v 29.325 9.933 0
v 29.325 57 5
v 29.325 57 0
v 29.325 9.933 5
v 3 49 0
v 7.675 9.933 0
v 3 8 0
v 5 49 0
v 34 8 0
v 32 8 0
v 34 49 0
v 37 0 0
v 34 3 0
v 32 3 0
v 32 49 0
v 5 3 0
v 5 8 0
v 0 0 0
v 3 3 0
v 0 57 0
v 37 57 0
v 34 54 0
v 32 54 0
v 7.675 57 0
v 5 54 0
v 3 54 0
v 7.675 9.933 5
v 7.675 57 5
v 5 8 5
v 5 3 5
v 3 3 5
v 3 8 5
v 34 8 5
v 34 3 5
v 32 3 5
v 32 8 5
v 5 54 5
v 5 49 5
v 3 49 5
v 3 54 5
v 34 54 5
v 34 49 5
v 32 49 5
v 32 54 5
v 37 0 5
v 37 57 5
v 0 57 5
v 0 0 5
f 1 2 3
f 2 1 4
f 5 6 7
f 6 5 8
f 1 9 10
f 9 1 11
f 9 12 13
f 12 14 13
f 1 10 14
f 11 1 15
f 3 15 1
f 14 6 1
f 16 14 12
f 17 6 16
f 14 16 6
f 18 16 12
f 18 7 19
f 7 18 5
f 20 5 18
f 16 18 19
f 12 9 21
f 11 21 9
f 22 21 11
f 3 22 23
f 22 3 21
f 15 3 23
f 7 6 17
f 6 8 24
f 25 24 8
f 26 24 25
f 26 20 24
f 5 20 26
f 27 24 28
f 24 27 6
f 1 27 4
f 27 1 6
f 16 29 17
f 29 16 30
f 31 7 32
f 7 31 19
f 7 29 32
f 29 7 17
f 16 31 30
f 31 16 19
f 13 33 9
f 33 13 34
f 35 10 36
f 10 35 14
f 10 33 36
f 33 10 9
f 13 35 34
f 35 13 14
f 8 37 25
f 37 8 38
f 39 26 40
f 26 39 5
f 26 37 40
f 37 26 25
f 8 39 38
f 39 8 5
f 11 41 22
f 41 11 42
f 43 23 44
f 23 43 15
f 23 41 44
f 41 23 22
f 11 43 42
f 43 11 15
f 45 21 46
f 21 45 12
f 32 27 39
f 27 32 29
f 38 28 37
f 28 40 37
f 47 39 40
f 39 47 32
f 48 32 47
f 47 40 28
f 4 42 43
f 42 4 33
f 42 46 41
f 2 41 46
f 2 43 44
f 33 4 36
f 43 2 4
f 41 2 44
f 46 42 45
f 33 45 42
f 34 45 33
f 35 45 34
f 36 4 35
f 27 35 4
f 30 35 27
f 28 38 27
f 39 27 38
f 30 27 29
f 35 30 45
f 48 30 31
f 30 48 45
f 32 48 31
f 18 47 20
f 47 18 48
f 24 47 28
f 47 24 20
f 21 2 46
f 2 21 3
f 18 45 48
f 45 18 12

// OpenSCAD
// Mount for cateye strada cadence sensor (zip tie)
// Created 30 August 2026 by Sam Gardner <sam@wx4stg.com>

inner_x = 21.65;
iouter_x = 25;
inner_y = 21.133;
iouter_y = 25;
plate_depth = 5;

ziptie_x_inset = 3;
ziptie_y_inset = 3;
ziptie_x = 2;
ziptie_y = 5;

extension_plate_x = 3*ziptie_x;
extension_plate_y = 2*(ziptie_y + ziptie_y_inset);

outer_x = iouter_x + 2*extension_plate_x;
outer_y = iouter_y + 2*extension_plate_y;

difference() {
    // Outer shell
    cube([outer_x, outer_y, plate_depth]);
    union() {
        // Inner cavity
        translate([(outer_x - inner_x)/2, ((outer_y - extension_plate_y) - inner_y)/2, 0]) cube([inner_x, outer_y, plate_depth + 1]);
        // Zip tie holes
        translate([ziptie_x_inset, ziptie_y_inset, 0]) cube([ziptie_x, ziptie_y, plate_depth + 1]);
        translate([(outer_x - ziptie_x_inset - ziptie_x), ziptie_y_inset, 0]) cube([ziptie_x, ziptie_y, plate_depth + 1]);
        translate([ziptie_x_inset, outer_y - ziptie_y_inset - ziptie_y, 0]) cube([ziptie_x, ziptie_y, plate_depth + 1]);
        translate([(outer_x - ziptie_x_inset - ziptie_x), outer_y - ziptie_y_inset - ziptie_y, 0]) cube([ziptie_x, ziptie_y, plate_depth + 1]);

    }
}
